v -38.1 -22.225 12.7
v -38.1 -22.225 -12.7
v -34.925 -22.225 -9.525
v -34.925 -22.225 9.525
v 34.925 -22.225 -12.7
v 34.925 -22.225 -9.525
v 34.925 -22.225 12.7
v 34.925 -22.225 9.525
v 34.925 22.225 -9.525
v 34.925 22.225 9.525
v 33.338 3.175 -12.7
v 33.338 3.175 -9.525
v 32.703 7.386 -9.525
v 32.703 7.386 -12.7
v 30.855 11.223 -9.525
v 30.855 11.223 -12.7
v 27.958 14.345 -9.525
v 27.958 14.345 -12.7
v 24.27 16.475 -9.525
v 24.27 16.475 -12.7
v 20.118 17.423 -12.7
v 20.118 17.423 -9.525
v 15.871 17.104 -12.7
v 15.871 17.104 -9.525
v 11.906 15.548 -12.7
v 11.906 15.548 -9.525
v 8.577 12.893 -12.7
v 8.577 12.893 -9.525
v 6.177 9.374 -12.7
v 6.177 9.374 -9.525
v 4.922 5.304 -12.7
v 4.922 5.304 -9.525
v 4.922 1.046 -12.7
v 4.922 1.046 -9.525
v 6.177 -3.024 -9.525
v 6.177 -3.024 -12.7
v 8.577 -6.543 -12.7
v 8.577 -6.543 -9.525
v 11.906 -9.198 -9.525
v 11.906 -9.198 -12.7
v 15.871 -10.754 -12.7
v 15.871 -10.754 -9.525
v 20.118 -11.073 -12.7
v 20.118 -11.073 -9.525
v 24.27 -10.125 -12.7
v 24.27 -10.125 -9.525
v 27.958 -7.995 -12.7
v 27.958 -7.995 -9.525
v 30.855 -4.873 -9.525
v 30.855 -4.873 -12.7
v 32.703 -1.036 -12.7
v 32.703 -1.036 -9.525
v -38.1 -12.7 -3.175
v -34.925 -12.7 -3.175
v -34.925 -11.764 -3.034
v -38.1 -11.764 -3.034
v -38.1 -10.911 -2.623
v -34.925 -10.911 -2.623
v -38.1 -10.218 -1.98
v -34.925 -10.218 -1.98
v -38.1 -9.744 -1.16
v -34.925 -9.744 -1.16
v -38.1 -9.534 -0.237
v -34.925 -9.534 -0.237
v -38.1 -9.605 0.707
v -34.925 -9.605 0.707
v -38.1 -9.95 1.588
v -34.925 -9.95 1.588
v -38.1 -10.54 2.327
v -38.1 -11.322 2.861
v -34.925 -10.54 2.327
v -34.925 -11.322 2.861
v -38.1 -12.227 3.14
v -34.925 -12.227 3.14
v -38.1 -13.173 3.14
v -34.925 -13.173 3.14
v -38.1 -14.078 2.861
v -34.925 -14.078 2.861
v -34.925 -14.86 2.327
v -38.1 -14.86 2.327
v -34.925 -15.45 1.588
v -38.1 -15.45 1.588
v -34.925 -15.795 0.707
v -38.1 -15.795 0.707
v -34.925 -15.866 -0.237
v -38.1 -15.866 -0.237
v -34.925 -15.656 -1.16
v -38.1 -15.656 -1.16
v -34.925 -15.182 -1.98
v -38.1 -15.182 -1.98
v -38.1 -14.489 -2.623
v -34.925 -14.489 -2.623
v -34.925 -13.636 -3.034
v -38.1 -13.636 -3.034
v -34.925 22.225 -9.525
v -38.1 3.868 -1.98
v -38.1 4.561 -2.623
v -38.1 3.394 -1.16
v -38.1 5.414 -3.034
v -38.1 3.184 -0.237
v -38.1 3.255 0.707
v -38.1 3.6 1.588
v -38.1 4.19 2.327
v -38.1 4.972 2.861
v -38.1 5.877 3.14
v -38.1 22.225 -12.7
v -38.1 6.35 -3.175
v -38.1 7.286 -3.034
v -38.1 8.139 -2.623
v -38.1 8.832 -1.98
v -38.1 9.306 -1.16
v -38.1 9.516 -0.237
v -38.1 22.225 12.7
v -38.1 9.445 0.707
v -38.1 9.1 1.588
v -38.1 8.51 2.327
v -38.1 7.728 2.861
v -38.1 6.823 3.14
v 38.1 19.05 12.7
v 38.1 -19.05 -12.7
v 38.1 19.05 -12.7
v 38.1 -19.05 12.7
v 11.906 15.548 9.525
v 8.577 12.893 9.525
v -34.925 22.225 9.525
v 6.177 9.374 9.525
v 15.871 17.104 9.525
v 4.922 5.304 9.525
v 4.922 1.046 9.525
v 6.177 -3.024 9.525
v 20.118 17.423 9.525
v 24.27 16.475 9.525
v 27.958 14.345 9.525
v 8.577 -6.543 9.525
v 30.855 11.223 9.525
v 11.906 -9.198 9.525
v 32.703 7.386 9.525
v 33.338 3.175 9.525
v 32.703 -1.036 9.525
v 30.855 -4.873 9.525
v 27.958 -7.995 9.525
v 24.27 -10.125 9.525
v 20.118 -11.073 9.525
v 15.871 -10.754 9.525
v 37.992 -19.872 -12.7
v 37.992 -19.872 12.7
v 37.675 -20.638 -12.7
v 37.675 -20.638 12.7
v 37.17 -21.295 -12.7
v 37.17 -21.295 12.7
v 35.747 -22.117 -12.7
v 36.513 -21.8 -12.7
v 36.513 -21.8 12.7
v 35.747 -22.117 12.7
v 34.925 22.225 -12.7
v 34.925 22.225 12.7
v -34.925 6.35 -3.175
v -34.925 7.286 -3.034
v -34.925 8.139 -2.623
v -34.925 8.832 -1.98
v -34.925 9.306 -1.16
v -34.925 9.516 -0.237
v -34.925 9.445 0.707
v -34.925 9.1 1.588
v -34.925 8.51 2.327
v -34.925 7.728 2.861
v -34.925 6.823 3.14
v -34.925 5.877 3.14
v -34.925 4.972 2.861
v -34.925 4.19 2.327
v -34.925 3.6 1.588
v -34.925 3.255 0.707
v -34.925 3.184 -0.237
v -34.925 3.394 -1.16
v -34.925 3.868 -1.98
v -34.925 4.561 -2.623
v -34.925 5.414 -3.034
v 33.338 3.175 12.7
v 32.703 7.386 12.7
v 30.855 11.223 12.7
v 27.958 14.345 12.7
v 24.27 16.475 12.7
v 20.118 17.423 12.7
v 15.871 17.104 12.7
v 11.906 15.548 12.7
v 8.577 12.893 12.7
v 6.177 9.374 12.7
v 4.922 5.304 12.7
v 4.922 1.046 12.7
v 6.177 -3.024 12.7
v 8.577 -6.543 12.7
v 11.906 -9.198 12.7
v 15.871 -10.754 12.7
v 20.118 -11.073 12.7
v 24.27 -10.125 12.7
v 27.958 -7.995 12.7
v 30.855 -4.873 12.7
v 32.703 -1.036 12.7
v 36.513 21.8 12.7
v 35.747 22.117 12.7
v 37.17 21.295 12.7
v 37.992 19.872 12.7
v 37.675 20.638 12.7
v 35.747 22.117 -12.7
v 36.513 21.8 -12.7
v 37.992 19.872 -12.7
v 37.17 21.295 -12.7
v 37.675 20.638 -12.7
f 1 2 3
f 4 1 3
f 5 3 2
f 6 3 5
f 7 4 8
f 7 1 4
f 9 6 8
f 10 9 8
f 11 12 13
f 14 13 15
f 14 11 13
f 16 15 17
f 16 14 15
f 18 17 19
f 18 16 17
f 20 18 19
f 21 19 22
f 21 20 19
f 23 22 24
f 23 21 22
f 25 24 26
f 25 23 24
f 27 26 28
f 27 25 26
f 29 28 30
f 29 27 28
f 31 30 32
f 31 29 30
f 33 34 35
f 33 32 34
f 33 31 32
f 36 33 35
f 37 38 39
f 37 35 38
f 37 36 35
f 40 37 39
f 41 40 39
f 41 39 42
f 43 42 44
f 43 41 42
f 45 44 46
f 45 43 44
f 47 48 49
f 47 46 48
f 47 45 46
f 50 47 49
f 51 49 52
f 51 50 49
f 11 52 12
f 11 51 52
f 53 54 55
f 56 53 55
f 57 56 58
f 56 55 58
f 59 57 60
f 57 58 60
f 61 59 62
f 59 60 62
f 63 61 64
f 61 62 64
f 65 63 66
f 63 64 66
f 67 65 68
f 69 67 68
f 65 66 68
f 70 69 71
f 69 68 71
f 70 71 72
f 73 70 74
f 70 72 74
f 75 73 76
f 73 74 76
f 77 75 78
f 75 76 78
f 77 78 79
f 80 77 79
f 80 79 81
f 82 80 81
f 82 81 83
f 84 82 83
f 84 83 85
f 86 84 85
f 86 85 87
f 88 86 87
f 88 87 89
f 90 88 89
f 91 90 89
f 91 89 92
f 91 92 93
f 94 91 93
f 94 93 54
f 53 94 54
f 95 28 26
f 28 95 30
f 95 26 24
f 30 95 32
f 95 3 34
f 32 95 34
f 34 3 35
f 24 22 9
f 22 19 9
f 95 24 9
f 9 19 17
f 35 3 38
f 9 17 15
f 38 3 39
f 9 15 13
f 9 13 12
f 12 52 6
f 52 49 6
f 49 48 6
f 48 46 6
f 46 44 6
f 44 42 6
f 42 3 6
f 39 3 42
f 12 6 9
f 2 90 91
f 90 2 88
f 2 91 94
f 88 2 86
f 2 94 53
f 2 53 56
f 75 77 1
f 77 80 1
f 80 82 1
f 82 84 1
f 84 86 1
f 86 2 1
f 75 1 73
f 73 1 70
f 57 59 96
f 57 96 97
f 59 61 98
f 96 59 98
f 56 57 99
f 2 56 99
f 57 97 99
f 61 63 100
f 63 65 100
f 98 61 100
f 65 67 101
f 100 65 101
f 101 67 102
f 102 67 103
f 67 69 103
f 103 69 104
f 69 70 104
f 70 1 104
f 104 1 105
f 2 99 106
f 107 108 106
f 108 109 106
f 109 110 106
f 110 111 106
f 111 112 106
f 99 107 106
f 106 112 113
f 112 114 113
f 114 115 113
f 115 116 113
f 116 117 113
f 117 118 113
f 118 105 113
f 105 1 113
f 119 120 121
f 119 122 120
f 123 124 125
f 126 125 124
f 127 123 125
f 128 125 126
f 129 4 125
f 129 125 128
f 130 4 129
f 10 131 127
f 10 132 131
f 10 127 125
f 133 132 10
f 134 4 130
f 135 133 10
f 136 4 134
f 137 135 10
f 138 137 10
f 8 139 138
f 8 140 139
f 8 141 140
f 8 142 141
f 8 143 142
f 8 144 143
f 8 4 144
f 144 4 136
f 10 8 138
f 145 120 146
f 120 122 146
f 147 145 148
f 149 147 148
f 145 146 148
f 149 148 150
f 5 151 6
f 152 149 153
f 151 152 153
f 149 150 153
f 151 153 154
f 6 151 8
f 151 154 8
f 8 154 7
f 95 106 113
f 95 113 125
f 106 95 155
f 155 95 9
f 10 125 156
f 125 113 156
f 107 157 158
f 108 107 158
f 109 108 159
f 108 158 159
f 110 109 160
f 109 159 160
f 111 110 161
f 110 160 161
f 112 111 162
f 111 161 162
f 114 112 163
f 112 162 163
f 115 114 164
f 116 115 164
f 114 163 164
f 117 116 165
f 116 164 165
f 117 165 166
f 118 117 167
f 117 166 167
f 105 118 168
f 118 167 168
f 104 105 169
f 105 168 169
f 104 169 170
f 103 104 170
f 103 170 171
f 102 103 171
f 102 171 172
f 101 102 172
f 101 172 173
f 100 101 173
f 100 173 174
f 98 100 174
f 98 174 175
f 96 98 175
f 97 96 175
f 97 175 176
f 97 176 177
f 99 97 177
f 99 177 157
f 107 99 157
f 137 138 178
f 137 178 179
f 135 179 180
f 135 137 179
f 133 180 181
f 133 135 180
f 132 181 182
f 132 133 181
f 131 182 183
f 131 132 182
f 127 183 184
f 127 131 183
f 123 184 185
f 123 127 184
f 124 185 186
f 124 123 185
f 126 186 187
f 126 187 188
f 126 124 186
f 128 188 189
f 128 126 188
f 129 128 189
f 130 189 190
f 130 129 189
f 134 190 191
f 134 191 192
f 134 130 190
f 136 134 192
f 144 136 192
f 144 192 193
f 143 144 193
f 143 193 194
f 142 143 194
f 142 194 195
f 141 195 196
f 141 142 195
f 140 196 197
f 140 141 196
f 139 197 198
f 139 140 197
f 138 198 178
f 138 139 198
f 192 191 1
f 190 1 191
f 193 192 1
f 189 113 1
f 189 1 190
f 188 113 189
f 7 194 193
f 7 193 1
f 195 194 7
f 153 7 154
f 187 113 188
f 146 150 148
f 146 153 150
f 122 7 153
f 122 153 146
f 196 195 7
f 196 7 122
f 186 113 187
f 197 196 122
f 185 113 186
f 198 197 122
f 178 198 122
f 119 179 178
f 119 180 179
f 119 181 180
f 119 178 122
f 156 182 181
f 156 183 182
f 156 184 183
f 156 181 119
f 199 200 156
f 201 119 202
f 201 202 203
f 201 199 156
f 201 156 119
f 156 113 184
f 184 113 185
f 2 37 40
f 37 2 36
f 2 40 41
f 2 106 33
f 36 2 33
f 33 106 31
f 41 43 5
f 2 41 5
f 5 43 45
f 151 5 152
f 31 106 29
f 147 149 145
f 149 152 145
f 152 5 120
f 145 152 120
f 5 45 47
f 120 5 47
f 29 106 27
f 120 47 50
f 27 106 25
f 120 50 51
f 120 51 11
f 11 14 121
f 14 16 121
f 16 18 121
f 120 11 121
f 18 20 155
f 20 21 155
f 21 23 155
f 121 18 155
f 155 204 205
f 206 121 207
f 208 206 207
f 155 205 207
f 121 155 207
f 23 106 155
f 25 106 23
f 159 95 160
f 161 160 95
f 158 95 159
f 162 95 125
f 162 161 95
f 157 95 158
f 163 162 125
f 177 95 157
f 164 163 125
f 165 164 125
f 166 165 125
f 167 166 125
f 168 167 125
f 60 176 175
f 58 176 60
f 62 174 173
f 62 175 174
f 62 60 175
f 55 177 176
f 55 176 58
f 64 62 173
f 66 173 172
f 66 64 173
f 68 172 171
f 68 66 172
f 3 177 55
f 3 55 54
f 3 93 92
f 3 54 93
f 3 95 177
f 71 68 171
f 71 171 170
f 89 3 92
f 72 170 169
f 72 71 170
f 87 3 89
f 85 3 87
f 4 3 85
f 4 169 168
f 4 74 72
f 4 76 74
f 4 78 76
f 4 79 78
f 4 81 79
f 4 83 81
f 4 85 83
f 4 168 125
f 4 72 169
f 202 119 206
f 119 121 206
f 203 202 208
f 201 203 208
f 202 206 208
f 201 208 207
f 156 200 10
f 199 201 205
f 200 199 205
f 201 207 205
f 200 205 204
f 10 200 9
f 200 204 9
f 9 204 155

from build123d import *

# Parameters (mm, degrees)
SKETCH1_W                       = 76.2
SKETCH1_H                       = 44.45
SKETCH1_R                       = 14.2875
BOSS_EXTRUDE1_DEPTH             = 12.7
FILLET1_R                       = 3.175
SKETCH3_W                       = 69.85
SKETCH3_H                       = 19.05
CUT_EXTRUDE2_DEPTH              = 60.905780189
F_1_4_0_25_DIAMETER_HOLE1_D     = 6.35
F_1_4_0_25_DIAMETER_HOLE1_DEPTH = 5.08
F_1_4_0_25_DIAMETER_HOLE1_TIP   = 1.907732465


with BuildPart() as part:
    # Sketch1 → Boss-Extrude1 (new, symmetric)
    with BuildSketch(Plane.XY):
        Rectangle(SKETCH1_W, SKETCH1_H)
        with Locations((19.05, 3.175)):
            Circle(SKETCH1_R, mode=Mode.SUBTRACT)
    extrude(amount=BOSS_EXTRUDE1_DEPTH, both=True)

    # Fillet1
    fillet1_edges = [part.edges().sort_by_distance(p)[0] for p in [
        (38.1, -22.225, 0),
        (38.1, 22.225, 0),
    ]]
    fillet(fillet1_edges, radius=FILLET1_R)

    # Sketch3 → Cut-Extrude2 (cut, through all)
    with BuildSketch(Plane.XZ.offset(22.225)):
        Rectangle(SKETCH3_W, SKETCH3_H)
    extrude(amount=-CUT_EXTRUDE2_DEPTH, mode=Mode.SUBTRACT)

    # 1/4 (0.25) Diameter Hole1
    with Locations(Plane.ZY.offset(38.1)):
        with Locations((0, 6.35), (0, -12.7)):
            Hole(F_1_4_0_25_DIAMETER_HOLE1_D / 2, depth=F_1_4_0_25_DIAMETER_HOLE1_DEPTH)
            with Locations((0, 0, -(F_1_4_0_25_DIAMETER_HOLE1_DEPTH + F_1_4_0_25_DIAMETER_HOLE1_TIP / 2))):  # 118° drill point
                Cone(0, F_1_4_0_25_DIAMETER_HOLE1_D / 2, F_1_4_0_25_DIAMETER_HOLE1_TIP, mode=Mode.SUBTRACT)


solid = part.part
